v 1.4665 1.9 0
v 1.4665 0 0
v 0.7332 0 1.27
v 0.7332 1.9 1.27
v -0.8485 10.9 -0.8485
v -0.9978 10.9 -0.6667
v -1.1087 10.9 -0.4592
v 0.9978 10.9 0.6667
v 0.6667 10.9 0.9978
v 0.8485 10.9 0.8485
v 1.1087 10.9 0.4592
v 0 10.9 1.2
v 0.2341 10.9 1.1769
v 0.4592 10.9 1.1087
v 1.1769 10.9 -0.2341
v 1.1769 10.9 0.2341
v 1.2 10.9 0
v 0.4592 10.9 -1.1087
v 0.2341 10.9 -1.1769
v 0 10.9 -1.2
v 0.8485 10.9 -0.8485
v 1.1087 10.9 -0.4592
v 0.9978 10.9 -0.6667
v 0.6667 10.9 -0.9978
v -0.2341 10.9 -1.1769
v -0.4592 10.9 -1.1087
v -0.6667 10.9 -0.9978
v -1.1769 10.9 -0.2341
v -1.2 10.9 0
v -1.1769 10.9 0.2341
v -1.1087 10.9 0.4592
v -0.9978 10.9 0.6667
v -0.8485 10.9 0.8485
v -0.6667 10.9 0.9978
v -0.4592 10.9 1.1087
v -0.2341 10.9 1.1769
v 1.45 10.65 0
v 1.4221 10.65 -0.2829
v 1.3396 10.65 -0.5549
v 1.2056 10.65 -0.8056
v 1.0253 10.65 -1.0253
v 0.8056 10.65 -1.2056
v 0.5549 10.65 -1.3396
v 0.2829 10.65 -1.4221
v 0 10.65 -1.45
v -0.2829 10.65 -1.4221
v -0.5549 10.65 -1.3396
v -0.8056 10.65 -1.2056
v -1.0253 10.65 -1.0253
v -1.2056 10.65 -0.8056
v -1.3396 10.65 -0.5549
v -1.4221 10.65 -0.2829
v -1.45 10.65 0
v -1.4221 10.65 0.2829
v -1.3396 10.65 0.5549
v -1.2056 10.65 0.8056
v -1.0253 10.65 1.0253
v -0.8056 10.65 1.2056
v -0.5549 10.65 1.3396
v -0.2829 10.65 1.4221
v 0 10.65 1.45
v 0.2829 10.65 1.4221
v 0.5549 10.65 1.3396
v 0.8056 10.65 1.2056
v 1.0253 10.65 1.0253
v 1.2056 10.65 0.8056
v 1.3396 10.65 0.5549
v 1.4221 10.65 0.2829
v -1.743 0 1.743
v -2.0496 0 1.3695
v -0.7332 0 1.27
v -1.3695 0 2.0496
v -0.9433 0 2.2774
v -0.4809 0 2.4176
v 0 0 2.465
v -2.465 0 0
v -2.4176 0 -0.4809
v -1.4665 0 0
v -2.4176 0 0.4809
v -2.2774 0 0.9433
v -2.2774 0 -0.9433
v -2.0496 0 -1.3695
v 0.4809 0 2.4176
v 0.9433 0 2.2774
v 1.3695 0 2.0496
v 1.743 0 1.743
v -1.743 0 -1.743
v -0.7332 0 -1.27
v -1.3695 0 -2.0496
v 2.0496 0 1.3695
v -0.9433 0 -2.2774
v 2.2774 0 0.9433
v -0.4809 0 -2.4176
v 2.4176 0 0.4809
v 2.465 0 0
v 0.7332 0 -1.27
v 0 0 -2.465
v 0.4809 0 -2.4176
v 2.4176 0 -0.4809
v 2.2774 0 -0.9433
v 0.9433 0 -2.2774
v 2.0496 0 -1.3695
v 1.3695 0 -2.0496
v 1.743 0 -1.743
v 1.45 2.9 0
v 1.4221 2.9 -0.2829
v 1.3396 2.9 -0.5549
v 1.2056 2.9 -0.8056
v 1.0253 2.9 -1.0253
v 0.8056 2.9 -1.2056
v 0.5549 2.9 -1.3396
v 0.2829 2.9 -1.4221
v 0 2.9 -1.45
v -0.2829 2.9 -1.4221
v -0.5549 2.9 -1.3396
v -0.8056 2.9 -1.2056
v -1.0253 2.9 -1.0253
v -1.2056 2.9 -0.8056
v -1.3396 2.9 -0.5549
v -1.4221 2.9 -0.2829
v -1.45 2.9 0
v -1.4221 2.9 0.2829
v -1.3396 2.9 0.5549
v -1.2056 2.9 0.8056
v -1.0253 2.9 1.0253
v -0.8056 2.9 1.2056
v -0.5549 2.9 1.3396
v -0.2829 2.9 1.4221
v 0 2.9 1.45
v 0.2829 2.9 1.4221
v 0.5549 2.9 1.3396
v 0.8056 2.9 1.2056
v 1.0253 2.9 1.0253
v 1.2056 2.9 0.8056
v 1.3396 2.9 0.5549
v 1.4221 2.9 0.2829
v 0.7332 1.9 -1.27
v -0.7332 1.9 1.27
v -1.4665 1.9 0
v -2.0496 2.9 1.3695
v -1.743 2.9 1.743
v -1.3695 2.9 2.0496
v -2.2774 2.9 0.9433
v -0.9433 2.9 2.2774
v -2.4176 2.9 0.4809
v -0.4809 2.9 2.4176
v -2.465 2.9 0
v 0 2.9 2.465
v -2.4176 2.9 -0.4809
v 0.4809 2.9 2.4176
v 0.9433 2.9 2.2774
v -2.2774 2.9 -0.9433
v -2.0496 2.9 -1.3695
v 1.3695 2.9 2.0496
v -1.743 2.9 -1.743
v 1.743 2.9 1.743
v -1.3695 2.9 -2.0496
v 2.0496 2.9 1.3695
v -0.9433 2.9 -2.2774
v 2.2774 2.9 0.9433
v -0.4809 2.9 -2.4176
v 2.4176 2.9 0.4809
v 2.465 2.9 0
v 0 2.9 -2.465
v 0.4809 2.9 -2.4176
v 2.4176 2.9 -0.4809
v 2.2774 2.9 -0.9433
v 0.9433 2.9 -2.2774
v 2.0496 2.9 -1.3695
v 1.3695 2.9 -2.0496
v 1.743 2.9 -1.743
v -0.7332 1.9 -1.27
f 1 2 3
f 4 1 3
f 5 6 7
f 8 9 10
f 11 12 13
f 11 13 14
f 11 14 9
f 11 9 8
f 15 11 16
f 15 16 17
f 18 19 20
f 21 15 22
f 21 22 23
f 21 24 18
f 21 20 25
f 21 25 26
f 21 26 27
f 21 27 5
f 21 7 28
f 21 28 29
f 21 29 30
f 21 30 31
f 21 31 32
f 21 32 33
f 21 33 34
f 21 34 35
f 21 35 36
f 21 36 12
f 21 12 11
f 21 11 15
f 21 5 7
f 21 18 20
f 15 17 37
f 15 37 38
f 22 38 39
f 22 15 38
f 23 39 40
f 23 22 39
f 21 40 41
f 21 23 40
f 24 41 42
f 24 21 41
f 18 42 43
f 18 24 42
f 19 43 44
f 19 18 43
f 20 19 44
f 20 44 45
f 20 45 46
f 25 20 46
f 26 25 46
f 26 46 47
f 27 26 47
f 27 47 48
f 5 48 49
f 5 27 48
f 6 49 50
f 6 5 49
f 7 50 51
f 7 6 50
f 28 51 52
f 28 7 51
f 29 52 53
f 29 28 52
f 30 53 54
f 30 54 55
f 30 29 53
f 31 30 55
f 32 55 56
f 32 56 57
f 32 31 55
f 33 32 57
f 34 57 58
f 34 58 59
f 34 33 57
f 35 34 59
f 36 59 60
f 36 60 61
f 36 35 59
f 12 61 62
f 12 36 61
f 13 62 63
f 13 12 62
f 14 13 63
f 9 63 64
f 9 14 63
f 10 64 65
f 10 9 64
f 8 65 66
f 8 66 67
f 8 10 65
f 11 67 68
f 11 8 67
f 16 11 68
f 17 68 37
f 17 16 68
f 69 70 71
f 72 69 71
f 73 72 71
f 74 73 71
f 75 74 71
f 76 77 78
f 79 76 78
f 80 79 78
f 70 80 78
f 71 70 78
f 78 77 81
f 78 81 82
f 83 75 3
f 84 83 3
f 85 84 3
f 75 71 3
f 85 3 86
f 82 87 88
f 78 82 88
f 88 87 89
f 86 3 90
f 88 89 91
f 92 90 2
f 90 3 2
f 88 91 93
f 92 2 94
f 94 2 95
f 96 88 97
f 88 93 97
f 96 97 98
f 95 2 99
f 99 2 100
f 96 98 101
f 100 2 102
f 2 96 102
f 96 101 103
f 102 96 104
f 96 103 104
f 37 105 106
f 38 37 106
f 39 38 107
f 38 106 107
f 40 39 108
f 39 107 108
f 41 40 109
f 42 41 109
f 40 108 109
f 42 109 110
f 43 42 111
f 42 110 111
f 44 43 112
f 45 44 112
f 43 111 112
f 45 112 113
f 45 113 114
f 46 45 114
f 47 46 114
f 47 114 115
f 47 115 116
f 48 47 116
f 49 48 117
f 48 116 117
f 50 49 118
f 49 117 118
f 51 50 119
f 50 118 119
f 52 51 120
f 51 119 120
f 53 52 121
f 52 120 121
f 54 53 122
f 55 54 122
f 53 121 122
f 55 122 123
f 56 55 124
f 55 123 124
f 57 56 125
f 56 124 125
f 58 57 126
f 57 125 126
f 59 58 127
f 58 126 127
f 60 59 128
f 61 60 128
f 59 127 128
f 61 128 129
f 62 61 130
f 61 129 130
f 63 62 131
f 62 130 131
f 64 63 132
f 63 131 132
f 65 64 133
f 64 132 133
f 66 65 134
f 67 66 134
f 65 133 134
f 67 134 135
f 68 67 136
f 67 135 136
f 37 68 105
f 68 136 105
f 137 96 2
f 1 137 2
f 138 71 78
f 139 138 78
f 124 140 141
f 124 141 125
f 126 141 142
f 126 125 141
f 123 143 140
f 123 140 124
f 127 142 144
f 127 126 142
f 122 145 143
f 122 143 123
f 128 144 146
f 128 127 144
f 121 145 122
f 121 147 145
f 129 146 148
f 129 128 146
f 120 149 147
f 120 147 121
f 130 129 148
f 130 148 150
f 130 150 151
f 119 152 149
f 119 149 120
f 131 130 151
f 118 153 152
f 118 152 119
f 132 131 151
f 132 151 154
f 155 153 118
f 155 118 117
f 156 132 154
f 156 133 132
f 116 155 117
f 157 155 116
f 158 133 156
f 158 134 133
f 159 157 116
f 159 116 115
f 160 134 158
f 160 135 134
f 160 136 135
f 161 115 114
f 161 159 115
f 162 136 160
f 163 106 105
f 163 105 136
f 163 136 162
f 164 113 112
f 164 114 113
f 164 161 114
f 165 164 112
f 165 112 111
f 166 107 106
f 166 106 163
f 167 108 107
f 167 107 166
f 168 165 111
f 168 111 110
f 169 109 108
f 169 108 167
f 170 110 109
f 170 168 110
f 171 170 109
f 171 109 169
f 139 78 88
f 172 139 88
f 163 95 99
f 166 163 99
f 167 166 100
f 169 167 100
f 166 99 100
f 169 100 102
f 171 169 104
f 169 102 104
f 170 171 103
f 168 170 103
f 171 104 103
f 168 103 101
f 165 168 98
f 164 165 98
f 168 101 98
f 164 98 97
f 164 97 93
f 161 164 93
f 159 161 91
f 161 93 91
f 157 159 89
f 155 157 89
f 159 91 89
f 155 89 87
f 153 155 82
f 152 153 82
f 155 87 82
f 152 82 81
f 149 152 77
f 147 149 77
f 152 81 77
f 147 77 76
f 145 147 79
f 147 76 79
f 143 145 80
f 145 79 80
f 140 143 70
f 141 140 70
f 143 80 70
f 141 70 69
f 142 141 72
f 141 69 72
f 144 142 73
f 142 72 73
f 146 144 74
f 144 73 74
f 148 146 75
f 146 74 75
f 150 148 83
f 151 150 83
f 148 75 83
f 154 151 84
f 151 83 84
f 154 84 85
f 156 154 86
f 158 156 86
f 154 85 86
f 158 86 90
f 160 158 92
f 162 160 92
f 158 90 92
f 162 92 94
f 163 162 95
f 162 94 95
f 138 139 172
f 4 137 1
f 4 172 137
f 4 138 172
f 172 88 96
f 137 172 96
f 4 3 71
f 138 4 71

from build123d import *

# Parameters (mm, degrees)
SKETCH1_R           = 2.465
BOSS_EXTRUDE1_DEPTH = 2.9
SKETCH2_R           = 1.45
BOSS_EXTRUDE2_DEPTH = 8
CUT_EXTRUDE1_DEPTH  = 1.9
CHAMFER1_SIZE       = 0.25


with BuildPart() as part:
    # Sketch1 → Boss-Extrude1 (new body)
    with BuildSketch(Plane(origin=(0, 0, 0), x_dir=(1, 0, 0), z_dir=(0, 1, 0))):
        Circle(SKETCH1_R)
    extrude(amount=BOSS_EXTRUDE1_DEPTH)

    # Sketch2 → Boss-Extrude2 (add)
    with BuildSketch(Plane(origin=(0, 2.9, 0), x_dir=(1, 0, 0), z_dir=(0, 1, 0))):
        Circle(SKETCH2_R)
    extrude(amount=BOSS_EXTRUDE2_DEPTH)

    # Sketch3 → Cut-Extrude1 (cut)
    with BuildSketch(Plane.XZ):
        Polygon((0.733234842, -1.27), (1.466469684, 0), (0.733234842, 1.27), (-0.733234842, 1.27), (-1.466469684, 0), (-0.733234842, -1.27), align=None)
    extrude(amount=-CUT_EXTRUDE1_DEPTH, mode=Mode.SUBTRACT)

    # Chamfer1
    chamfer1_edges = [part.edges().sort_by_distance(p)[0] for p in [
        (-1.45, 10.9, 0),
    ]]
    chamfer(chamfer1_edges, length=CHAMFER1_SIZE)


solid = part.part
